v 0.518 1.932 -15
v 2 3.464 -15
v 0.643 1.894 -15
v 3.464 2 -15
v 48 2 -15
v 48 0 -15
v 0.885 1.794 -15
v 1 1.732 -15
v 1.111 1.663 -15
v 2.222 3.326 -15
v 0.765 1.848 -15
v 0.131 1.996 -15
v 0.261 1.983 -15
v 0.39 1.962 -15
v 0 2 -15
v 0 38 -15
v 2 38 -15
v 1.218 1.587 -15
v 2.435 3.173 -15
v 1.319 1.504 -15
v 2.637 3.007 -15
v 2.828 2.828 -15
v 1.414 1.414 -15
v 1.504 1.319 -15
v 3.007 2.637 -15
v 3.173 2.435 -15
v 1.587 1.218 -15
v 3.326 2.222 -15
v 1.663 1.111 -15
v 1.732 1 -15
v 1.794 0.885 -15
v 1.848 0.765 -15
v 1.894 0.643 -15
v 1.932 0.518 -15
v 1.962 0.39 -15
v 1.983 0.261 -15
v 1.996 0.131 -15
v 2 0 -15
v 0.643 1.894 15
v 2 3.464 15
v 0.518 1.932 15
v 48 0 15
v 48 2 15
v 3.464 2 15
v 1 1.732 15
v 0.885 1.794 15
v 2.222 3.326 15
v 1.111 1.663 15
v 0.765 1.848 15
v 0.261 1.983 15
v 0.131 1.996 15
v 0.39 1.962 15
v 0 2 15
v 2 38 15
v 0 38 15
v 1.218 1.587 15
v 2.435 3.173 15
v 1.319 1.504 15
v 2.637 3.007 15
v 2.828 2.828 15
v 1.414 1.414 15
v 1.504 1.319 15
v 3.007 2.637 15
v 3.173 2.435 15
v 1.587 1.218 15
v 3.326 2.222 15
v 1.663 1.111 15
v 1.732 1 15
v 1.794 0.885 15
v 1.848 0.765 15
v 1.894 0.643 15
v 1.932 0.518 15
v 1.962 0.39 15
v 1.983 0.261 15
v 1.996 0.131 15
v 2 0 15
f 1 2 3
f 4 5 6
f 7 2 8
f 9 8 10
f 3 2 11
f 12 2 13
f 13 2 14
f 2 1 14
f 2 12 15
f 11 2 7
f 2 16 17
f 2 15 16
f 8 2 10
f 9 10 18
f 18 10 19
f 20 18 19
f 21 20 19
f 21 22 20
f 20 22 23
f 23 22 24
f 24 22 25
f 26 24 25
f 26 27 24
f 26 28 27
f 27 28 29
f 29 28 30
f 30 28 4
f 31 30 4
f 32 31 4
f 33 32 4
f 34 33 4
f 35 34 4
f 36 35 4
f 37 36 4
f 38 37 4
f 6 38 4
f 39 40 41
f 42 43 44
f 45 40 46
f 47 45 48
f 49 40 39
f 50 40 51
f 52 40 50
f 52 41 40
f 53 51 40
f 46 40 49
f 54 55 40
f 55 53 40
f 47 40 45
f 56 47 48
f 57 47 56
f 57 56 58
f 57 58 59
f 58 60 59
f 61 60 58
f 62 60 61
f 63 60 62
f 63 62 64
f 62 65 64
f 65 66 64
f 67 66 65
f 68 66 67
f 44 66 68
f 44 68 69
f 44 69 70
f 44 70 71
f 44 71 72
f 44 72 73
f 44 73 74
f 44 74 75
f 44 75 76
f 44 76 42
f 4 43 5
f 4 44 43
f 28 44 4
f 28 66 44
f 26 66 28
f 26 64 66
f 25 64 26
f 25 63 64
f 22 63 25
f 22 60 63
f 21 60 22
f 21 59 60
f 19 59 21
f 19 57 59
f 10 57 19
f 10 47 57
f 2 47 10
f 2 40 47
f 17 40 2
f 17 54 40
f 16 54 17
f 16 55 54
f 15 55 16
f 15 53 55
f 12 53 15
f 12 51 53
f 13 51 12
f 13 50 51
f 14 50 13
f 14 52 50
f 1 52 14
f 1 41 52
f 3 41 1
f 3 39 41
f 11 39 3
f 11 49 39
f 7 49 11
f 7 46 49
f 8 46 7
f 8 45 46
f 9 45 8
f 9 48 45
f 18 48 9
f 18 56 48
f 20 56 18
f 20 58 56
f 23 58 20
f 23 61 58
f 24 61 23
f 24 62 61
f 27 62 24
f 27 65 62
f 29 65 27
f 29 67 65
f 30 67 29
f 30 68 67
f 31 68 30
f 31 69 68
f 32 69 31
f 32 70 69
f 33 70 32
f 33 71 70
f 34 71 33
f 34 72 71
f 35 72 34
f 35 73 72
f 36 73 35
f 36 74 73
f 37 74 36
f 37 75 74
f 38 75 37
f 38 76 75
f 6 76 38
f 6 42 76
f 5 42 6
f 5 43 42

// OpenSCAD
// Units: mm
thickness_mm = 2.0;
bend_radius_mm = 2.0;
k_factor = 0.45;
bend_angle_deg = 90;
bend_angle_rad = PI / 2;

outside_flange_A_mm = 50;
outside_flange_B_mm = 40;
width_mm = 30;

outside_radius_mm = bend_radius_mm + thickness_mm;
outside_setback_mm = outside_radius_mm * tan(bend_angle_deg / 2);
bend_allowance_mm = bend_angle_rad * (bend_radius_mm + k_factor * thickness_mm);
developed_flat_length_mm =
    outside_flange_A_mm + outside_flange_B_mm
    - (2 * outside_setback_mm - bend_allowance_mm);

straight_A_mm = outside_flange_A_mm - outside_setback_mm;
straight_B_mm = outside_flange_B_mm - outside_setback_mm;

$fn = 96;

echo(str(
    "MAKERBENCH-SHEETMETAL: {",
    "\"thickness_mm\":", thickness_mm, ",",
    "\"bend_radius_mm\":", bend_radius_mm, ",",
    "\"developed_flat_length_mm\":", developed_flat_length_mm,
    "}"
));

module formed_l_bracket() {
    linear_extrude(height = width_mm, center = true, convexity = 10)
        union() {
            translate([bend_radius_mm, 0])
                square([straight_A_mm, thickness_mm], center = false);

            translate([0, bend_radius_mm])
                square([thickness_mm, straight_B_mm], center = false);

            difference() {
                circle(r = outside_radius_mm);
                circle(r = bend_radius_mm);
                translate([-outside_radius_mm - 1, -outside_radius_mm - 1])
                    square([outside_radius_mm + 1, 2 * outside_radius_mm + 2], center = false);
                translate([-outside_radius_mm - 1, -outside_radius_mm - 1])
                    square([2 * outside_radius_mm + 2, outside_radius_mm + 1], center = false);
            }
        }
}

formed_l_bracket();
